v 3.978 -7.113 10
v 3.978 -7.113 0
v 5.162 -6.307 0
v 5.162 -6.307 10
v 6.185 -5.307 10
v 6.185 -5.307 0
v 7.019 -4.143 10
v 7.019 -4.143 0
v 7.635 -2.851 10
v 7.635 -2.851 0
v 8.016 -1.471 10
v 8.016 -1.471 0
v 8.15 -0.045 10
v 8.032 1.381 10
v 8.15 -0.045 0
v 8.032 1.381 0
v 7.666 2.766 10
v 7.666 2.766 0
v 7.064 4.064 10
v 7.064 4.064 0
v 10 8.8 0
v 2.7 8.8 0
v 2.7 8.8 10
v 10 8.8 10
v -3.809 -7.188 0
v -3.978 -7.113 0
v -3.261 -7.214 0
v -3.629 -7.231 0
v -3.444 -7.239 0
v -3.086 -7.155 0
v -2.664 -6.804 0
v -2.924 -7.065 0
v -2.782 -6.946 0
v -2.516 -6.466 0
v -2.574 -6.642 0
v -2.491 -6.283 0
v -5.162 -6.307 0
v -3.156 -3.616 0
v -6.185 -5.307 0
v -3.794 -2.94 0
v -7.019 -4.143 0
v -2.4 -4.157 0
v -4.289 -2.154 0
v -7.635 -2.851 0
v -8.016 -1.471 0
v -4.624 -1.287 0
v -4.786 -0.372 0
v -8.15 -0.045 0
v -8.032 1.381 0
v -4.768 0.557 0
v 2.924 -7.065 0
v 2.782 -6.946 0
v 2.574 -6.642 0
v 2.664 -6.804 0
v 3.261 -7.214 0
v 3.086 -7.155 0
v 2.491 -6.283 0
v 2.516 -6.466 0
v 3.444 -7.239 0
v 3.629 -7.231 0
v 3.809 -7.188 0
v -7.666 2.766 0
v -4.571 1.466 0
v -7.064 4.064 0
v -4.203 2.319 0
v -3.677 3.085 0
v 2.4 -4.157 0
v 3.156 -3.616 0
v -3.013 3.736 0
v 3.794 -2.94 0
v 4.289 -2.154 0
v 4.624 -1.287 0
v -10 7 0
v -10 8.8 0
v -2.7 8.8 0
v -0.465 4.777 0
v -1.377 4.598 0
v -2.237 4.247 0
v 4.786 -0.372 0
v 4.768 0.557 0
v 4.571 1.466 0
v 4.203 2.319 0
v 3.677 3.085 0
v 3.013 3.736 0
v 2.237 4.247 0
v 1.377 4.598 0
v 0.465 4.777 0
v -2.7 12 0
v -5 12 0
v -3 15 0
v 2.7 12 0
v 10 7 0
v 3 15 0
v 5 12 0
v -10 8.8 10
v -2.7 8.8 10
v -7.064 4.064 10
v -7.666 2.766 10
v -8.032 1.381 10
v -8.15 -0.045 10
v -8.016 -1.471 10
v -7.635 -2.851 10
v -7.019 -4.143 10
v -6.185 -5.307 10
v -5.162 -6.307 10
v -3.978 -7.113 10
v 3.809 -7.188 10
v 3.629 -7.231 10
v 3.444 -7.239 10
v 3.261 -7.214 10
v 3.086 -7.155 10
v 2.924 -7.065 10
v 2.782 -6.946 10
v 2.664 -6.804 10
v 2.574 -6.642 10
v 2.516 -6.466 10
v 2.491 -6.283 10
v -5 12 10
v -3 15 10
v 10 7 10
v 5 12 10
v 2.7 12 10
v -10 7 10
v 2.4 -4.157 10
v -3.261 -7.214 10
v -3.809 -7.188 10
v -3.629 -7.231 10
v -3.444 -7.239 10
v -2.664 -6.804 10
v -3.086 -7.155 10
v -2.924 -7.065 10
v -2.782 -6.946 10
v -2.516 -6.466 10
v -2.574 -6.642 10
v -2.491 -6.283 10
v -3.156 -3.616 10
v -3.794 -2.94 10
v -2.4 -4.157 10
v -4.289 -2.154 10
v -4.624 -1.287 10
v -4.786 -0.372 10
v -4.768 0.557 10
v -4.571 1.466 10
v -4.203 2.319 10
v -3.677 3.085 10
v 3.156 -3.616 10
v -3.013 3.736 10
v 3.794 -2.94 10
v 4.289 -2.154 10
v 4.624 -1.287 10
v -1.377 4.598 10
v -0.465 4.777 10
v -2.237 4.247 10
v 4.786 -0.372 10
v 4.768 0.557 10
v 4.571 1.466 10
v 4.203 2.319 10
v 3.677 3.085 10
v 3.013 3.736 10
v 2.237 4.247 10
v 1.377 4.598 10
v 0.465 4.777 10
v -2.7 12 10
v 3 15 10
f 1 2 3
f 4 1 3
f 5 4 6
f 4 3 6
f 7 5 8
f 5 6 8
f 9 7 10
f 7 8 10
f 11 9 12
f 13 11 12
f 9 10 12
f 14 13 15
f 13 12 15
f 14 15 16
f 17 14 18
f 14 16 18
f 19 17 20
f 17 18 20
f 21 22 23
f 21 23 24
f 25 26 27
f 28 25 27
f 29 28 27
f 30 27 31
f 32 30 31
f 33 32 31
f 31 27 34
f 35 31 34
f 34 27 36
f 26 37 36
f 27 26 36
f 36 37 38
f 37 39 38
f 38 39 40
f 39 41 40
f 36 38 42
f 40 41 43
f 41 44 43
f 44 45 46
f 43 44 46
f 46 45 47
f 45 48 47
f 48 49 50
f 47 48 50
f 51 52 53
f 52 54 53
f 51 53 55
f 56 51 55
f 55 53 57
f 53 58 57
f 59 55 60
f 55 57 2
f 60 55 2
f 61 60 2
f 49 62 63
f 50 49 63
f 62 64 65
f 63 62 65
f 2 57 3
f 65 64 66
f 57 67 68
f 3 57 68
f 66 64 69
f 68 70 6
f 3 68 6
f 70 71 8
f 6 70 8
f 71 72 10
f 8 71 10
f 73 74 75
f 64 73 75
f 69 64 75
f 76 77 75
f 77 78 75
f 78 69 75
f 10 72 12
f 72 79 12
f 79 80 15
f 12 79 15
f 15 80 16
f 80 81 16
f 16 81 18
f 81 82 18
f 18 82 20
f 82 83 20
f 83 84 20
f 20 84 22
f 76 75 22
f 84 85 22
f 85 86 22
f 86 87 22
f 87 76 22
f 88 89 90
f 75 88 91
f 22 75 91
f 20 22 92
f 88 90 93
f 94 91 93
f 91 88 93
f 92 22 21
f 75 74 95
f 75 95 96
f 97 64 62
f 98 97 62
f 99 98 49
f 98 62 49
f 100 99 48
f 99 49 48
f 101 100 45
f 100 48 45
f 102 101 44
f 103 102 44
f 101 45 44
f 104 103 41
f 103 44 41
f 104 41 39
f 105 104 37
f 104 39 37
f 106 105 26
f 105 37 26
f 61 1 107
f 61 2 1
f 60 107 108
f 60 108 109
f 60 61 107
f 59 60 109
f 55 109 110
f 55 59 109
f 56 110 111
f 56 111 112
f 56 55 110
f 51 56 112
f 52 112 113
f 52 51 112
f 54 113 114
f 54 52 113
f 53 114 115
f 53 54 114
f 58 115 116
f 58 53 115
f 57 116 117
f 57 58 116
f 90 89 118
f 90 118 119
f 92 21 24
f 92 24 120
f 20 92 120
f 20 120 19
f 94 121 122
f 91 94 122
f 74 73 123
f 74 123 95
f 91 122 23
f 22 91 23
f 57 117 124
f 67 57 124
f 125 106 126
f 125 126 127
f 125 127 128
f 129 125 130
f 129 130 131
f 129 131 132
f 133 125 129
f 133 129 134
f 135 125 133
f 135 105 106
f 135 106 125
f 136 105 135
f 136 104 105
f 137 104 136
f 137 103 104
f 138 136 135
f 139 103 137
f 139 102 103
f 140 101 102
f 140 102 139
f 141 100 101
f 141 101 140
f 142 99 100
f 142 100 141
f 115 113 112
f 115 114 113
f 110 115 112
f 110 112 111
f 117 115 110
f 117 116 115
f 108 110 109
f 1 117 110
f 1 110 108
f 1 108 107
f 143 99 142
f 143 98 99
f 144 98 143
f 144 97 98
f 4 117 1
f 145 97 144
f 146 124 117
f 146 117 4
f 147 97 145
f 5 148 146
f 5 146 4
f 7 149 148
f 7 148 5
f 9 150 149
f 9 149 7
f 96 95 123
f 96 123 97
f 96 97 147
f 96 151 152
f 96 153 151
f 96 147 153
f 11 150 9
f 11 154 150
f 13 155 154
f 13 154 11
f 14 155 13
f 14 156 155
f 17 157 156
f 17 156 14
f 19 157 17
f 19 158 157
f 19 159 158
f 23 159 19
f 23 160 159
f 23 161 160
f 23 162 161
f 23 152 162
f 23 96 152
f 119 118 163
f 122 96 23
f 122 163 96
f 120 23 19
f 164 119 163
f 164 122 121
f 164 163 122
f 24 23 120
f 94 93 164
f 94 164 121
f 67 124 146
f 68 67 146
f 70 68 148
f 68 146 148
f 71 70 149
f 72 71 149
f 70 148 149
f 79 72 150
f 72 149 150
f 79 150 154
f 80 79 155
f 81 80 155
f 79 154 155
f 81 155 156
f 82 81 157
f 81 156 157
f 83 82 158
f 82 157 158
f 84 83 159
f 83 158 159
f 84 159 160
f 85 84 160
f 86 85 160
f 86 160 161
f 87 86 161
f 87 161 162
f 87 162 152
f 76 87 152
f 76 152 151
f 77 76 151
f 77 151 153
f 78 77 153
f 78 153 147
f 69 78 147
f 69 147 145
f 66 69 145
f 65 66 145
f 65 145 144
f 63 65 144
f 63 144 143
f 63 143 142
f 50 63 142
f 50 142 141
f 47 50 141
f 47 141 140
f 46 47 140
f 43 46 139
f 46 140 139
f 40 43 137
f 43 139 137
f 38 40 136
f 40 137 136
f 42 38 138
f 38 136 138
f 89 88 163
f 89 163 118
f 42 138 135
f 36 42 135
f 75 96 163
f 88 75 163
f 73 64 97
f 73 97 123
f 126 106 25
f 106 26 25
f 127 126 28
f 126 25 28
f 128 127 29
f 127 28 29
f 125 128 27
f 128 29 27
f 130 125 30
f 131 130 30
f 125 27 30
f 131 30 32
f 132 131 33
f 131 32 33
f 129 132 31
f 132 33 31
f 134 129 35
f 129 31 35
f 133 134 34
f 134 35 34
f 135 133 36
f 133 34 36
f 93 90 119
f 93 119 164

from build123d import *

# Parameters (mm, degrees)
PAD_DEPTH    = 10
POCKET_DEPTH = 10.001
FILLET_R     = 1


with BuildPart() as part:
    # Sketch → Pad (new body)
    with BuildSketch(Plane.XY):
        with BuildLine():
            ThreePointArc((-7.064283, 4.064283), (0, -8.15), (7.064283, 4.064283))
            Line((10, 7), (7.064283, 4.064283))
            Line((10, 8.8), (10, 7))
            Line((2.7, 8.8), (10, 8.8))
            Line((2.7, 12), (2.7, 8.8))
            Line((5, 12), (2.7, 12))
            Line((3, 15), (5, 12))
            Line((-3, 15), (3, 15))
            Line((-5, 12), (-3, 15))
            Line((-2.7, 12), (-5, 12))
            Line((-2.7, 8.8), (-2.7, 12))
            Line((-10, 8.8), (-2.7, 8.8))
            Line((-10, 7), (-10, 8.8))
            Line((-7.064283, 4.064283), (-10, 7))
        make_face()
    extrude(amount=PAD_DEPTH)

    # Sketch001 → Pocket (cut, through all)
    with BuildSketch(Plane.XY.offset(10)):
        with BuildLine():
            ThreePointArc((2.4, -4.156922), (0, 4.8), (-2.4, -4.156922))
            Line((-2.4, -4.156922), (-2.614108, -9.156922))
            Line((-2.614108, -9.156922), (2.614108, -9.156922))
            Line((2.614108, -9.156922), (2.4, -4.156922))
        make_face()
    extrude(amount=-POCKET_DEPTH, mode=Mode.SUBTRACT)

    # Fillet
    fillet_edges = [part.edges().sort_by_distance(p)[0] for p in [
        (-2.553419, -7.739674, 5),
        (2.553419, -7.739674, 5),
    ]]
    fillet(fillet_edges, radius=FILLET_R)


solid = part.part
